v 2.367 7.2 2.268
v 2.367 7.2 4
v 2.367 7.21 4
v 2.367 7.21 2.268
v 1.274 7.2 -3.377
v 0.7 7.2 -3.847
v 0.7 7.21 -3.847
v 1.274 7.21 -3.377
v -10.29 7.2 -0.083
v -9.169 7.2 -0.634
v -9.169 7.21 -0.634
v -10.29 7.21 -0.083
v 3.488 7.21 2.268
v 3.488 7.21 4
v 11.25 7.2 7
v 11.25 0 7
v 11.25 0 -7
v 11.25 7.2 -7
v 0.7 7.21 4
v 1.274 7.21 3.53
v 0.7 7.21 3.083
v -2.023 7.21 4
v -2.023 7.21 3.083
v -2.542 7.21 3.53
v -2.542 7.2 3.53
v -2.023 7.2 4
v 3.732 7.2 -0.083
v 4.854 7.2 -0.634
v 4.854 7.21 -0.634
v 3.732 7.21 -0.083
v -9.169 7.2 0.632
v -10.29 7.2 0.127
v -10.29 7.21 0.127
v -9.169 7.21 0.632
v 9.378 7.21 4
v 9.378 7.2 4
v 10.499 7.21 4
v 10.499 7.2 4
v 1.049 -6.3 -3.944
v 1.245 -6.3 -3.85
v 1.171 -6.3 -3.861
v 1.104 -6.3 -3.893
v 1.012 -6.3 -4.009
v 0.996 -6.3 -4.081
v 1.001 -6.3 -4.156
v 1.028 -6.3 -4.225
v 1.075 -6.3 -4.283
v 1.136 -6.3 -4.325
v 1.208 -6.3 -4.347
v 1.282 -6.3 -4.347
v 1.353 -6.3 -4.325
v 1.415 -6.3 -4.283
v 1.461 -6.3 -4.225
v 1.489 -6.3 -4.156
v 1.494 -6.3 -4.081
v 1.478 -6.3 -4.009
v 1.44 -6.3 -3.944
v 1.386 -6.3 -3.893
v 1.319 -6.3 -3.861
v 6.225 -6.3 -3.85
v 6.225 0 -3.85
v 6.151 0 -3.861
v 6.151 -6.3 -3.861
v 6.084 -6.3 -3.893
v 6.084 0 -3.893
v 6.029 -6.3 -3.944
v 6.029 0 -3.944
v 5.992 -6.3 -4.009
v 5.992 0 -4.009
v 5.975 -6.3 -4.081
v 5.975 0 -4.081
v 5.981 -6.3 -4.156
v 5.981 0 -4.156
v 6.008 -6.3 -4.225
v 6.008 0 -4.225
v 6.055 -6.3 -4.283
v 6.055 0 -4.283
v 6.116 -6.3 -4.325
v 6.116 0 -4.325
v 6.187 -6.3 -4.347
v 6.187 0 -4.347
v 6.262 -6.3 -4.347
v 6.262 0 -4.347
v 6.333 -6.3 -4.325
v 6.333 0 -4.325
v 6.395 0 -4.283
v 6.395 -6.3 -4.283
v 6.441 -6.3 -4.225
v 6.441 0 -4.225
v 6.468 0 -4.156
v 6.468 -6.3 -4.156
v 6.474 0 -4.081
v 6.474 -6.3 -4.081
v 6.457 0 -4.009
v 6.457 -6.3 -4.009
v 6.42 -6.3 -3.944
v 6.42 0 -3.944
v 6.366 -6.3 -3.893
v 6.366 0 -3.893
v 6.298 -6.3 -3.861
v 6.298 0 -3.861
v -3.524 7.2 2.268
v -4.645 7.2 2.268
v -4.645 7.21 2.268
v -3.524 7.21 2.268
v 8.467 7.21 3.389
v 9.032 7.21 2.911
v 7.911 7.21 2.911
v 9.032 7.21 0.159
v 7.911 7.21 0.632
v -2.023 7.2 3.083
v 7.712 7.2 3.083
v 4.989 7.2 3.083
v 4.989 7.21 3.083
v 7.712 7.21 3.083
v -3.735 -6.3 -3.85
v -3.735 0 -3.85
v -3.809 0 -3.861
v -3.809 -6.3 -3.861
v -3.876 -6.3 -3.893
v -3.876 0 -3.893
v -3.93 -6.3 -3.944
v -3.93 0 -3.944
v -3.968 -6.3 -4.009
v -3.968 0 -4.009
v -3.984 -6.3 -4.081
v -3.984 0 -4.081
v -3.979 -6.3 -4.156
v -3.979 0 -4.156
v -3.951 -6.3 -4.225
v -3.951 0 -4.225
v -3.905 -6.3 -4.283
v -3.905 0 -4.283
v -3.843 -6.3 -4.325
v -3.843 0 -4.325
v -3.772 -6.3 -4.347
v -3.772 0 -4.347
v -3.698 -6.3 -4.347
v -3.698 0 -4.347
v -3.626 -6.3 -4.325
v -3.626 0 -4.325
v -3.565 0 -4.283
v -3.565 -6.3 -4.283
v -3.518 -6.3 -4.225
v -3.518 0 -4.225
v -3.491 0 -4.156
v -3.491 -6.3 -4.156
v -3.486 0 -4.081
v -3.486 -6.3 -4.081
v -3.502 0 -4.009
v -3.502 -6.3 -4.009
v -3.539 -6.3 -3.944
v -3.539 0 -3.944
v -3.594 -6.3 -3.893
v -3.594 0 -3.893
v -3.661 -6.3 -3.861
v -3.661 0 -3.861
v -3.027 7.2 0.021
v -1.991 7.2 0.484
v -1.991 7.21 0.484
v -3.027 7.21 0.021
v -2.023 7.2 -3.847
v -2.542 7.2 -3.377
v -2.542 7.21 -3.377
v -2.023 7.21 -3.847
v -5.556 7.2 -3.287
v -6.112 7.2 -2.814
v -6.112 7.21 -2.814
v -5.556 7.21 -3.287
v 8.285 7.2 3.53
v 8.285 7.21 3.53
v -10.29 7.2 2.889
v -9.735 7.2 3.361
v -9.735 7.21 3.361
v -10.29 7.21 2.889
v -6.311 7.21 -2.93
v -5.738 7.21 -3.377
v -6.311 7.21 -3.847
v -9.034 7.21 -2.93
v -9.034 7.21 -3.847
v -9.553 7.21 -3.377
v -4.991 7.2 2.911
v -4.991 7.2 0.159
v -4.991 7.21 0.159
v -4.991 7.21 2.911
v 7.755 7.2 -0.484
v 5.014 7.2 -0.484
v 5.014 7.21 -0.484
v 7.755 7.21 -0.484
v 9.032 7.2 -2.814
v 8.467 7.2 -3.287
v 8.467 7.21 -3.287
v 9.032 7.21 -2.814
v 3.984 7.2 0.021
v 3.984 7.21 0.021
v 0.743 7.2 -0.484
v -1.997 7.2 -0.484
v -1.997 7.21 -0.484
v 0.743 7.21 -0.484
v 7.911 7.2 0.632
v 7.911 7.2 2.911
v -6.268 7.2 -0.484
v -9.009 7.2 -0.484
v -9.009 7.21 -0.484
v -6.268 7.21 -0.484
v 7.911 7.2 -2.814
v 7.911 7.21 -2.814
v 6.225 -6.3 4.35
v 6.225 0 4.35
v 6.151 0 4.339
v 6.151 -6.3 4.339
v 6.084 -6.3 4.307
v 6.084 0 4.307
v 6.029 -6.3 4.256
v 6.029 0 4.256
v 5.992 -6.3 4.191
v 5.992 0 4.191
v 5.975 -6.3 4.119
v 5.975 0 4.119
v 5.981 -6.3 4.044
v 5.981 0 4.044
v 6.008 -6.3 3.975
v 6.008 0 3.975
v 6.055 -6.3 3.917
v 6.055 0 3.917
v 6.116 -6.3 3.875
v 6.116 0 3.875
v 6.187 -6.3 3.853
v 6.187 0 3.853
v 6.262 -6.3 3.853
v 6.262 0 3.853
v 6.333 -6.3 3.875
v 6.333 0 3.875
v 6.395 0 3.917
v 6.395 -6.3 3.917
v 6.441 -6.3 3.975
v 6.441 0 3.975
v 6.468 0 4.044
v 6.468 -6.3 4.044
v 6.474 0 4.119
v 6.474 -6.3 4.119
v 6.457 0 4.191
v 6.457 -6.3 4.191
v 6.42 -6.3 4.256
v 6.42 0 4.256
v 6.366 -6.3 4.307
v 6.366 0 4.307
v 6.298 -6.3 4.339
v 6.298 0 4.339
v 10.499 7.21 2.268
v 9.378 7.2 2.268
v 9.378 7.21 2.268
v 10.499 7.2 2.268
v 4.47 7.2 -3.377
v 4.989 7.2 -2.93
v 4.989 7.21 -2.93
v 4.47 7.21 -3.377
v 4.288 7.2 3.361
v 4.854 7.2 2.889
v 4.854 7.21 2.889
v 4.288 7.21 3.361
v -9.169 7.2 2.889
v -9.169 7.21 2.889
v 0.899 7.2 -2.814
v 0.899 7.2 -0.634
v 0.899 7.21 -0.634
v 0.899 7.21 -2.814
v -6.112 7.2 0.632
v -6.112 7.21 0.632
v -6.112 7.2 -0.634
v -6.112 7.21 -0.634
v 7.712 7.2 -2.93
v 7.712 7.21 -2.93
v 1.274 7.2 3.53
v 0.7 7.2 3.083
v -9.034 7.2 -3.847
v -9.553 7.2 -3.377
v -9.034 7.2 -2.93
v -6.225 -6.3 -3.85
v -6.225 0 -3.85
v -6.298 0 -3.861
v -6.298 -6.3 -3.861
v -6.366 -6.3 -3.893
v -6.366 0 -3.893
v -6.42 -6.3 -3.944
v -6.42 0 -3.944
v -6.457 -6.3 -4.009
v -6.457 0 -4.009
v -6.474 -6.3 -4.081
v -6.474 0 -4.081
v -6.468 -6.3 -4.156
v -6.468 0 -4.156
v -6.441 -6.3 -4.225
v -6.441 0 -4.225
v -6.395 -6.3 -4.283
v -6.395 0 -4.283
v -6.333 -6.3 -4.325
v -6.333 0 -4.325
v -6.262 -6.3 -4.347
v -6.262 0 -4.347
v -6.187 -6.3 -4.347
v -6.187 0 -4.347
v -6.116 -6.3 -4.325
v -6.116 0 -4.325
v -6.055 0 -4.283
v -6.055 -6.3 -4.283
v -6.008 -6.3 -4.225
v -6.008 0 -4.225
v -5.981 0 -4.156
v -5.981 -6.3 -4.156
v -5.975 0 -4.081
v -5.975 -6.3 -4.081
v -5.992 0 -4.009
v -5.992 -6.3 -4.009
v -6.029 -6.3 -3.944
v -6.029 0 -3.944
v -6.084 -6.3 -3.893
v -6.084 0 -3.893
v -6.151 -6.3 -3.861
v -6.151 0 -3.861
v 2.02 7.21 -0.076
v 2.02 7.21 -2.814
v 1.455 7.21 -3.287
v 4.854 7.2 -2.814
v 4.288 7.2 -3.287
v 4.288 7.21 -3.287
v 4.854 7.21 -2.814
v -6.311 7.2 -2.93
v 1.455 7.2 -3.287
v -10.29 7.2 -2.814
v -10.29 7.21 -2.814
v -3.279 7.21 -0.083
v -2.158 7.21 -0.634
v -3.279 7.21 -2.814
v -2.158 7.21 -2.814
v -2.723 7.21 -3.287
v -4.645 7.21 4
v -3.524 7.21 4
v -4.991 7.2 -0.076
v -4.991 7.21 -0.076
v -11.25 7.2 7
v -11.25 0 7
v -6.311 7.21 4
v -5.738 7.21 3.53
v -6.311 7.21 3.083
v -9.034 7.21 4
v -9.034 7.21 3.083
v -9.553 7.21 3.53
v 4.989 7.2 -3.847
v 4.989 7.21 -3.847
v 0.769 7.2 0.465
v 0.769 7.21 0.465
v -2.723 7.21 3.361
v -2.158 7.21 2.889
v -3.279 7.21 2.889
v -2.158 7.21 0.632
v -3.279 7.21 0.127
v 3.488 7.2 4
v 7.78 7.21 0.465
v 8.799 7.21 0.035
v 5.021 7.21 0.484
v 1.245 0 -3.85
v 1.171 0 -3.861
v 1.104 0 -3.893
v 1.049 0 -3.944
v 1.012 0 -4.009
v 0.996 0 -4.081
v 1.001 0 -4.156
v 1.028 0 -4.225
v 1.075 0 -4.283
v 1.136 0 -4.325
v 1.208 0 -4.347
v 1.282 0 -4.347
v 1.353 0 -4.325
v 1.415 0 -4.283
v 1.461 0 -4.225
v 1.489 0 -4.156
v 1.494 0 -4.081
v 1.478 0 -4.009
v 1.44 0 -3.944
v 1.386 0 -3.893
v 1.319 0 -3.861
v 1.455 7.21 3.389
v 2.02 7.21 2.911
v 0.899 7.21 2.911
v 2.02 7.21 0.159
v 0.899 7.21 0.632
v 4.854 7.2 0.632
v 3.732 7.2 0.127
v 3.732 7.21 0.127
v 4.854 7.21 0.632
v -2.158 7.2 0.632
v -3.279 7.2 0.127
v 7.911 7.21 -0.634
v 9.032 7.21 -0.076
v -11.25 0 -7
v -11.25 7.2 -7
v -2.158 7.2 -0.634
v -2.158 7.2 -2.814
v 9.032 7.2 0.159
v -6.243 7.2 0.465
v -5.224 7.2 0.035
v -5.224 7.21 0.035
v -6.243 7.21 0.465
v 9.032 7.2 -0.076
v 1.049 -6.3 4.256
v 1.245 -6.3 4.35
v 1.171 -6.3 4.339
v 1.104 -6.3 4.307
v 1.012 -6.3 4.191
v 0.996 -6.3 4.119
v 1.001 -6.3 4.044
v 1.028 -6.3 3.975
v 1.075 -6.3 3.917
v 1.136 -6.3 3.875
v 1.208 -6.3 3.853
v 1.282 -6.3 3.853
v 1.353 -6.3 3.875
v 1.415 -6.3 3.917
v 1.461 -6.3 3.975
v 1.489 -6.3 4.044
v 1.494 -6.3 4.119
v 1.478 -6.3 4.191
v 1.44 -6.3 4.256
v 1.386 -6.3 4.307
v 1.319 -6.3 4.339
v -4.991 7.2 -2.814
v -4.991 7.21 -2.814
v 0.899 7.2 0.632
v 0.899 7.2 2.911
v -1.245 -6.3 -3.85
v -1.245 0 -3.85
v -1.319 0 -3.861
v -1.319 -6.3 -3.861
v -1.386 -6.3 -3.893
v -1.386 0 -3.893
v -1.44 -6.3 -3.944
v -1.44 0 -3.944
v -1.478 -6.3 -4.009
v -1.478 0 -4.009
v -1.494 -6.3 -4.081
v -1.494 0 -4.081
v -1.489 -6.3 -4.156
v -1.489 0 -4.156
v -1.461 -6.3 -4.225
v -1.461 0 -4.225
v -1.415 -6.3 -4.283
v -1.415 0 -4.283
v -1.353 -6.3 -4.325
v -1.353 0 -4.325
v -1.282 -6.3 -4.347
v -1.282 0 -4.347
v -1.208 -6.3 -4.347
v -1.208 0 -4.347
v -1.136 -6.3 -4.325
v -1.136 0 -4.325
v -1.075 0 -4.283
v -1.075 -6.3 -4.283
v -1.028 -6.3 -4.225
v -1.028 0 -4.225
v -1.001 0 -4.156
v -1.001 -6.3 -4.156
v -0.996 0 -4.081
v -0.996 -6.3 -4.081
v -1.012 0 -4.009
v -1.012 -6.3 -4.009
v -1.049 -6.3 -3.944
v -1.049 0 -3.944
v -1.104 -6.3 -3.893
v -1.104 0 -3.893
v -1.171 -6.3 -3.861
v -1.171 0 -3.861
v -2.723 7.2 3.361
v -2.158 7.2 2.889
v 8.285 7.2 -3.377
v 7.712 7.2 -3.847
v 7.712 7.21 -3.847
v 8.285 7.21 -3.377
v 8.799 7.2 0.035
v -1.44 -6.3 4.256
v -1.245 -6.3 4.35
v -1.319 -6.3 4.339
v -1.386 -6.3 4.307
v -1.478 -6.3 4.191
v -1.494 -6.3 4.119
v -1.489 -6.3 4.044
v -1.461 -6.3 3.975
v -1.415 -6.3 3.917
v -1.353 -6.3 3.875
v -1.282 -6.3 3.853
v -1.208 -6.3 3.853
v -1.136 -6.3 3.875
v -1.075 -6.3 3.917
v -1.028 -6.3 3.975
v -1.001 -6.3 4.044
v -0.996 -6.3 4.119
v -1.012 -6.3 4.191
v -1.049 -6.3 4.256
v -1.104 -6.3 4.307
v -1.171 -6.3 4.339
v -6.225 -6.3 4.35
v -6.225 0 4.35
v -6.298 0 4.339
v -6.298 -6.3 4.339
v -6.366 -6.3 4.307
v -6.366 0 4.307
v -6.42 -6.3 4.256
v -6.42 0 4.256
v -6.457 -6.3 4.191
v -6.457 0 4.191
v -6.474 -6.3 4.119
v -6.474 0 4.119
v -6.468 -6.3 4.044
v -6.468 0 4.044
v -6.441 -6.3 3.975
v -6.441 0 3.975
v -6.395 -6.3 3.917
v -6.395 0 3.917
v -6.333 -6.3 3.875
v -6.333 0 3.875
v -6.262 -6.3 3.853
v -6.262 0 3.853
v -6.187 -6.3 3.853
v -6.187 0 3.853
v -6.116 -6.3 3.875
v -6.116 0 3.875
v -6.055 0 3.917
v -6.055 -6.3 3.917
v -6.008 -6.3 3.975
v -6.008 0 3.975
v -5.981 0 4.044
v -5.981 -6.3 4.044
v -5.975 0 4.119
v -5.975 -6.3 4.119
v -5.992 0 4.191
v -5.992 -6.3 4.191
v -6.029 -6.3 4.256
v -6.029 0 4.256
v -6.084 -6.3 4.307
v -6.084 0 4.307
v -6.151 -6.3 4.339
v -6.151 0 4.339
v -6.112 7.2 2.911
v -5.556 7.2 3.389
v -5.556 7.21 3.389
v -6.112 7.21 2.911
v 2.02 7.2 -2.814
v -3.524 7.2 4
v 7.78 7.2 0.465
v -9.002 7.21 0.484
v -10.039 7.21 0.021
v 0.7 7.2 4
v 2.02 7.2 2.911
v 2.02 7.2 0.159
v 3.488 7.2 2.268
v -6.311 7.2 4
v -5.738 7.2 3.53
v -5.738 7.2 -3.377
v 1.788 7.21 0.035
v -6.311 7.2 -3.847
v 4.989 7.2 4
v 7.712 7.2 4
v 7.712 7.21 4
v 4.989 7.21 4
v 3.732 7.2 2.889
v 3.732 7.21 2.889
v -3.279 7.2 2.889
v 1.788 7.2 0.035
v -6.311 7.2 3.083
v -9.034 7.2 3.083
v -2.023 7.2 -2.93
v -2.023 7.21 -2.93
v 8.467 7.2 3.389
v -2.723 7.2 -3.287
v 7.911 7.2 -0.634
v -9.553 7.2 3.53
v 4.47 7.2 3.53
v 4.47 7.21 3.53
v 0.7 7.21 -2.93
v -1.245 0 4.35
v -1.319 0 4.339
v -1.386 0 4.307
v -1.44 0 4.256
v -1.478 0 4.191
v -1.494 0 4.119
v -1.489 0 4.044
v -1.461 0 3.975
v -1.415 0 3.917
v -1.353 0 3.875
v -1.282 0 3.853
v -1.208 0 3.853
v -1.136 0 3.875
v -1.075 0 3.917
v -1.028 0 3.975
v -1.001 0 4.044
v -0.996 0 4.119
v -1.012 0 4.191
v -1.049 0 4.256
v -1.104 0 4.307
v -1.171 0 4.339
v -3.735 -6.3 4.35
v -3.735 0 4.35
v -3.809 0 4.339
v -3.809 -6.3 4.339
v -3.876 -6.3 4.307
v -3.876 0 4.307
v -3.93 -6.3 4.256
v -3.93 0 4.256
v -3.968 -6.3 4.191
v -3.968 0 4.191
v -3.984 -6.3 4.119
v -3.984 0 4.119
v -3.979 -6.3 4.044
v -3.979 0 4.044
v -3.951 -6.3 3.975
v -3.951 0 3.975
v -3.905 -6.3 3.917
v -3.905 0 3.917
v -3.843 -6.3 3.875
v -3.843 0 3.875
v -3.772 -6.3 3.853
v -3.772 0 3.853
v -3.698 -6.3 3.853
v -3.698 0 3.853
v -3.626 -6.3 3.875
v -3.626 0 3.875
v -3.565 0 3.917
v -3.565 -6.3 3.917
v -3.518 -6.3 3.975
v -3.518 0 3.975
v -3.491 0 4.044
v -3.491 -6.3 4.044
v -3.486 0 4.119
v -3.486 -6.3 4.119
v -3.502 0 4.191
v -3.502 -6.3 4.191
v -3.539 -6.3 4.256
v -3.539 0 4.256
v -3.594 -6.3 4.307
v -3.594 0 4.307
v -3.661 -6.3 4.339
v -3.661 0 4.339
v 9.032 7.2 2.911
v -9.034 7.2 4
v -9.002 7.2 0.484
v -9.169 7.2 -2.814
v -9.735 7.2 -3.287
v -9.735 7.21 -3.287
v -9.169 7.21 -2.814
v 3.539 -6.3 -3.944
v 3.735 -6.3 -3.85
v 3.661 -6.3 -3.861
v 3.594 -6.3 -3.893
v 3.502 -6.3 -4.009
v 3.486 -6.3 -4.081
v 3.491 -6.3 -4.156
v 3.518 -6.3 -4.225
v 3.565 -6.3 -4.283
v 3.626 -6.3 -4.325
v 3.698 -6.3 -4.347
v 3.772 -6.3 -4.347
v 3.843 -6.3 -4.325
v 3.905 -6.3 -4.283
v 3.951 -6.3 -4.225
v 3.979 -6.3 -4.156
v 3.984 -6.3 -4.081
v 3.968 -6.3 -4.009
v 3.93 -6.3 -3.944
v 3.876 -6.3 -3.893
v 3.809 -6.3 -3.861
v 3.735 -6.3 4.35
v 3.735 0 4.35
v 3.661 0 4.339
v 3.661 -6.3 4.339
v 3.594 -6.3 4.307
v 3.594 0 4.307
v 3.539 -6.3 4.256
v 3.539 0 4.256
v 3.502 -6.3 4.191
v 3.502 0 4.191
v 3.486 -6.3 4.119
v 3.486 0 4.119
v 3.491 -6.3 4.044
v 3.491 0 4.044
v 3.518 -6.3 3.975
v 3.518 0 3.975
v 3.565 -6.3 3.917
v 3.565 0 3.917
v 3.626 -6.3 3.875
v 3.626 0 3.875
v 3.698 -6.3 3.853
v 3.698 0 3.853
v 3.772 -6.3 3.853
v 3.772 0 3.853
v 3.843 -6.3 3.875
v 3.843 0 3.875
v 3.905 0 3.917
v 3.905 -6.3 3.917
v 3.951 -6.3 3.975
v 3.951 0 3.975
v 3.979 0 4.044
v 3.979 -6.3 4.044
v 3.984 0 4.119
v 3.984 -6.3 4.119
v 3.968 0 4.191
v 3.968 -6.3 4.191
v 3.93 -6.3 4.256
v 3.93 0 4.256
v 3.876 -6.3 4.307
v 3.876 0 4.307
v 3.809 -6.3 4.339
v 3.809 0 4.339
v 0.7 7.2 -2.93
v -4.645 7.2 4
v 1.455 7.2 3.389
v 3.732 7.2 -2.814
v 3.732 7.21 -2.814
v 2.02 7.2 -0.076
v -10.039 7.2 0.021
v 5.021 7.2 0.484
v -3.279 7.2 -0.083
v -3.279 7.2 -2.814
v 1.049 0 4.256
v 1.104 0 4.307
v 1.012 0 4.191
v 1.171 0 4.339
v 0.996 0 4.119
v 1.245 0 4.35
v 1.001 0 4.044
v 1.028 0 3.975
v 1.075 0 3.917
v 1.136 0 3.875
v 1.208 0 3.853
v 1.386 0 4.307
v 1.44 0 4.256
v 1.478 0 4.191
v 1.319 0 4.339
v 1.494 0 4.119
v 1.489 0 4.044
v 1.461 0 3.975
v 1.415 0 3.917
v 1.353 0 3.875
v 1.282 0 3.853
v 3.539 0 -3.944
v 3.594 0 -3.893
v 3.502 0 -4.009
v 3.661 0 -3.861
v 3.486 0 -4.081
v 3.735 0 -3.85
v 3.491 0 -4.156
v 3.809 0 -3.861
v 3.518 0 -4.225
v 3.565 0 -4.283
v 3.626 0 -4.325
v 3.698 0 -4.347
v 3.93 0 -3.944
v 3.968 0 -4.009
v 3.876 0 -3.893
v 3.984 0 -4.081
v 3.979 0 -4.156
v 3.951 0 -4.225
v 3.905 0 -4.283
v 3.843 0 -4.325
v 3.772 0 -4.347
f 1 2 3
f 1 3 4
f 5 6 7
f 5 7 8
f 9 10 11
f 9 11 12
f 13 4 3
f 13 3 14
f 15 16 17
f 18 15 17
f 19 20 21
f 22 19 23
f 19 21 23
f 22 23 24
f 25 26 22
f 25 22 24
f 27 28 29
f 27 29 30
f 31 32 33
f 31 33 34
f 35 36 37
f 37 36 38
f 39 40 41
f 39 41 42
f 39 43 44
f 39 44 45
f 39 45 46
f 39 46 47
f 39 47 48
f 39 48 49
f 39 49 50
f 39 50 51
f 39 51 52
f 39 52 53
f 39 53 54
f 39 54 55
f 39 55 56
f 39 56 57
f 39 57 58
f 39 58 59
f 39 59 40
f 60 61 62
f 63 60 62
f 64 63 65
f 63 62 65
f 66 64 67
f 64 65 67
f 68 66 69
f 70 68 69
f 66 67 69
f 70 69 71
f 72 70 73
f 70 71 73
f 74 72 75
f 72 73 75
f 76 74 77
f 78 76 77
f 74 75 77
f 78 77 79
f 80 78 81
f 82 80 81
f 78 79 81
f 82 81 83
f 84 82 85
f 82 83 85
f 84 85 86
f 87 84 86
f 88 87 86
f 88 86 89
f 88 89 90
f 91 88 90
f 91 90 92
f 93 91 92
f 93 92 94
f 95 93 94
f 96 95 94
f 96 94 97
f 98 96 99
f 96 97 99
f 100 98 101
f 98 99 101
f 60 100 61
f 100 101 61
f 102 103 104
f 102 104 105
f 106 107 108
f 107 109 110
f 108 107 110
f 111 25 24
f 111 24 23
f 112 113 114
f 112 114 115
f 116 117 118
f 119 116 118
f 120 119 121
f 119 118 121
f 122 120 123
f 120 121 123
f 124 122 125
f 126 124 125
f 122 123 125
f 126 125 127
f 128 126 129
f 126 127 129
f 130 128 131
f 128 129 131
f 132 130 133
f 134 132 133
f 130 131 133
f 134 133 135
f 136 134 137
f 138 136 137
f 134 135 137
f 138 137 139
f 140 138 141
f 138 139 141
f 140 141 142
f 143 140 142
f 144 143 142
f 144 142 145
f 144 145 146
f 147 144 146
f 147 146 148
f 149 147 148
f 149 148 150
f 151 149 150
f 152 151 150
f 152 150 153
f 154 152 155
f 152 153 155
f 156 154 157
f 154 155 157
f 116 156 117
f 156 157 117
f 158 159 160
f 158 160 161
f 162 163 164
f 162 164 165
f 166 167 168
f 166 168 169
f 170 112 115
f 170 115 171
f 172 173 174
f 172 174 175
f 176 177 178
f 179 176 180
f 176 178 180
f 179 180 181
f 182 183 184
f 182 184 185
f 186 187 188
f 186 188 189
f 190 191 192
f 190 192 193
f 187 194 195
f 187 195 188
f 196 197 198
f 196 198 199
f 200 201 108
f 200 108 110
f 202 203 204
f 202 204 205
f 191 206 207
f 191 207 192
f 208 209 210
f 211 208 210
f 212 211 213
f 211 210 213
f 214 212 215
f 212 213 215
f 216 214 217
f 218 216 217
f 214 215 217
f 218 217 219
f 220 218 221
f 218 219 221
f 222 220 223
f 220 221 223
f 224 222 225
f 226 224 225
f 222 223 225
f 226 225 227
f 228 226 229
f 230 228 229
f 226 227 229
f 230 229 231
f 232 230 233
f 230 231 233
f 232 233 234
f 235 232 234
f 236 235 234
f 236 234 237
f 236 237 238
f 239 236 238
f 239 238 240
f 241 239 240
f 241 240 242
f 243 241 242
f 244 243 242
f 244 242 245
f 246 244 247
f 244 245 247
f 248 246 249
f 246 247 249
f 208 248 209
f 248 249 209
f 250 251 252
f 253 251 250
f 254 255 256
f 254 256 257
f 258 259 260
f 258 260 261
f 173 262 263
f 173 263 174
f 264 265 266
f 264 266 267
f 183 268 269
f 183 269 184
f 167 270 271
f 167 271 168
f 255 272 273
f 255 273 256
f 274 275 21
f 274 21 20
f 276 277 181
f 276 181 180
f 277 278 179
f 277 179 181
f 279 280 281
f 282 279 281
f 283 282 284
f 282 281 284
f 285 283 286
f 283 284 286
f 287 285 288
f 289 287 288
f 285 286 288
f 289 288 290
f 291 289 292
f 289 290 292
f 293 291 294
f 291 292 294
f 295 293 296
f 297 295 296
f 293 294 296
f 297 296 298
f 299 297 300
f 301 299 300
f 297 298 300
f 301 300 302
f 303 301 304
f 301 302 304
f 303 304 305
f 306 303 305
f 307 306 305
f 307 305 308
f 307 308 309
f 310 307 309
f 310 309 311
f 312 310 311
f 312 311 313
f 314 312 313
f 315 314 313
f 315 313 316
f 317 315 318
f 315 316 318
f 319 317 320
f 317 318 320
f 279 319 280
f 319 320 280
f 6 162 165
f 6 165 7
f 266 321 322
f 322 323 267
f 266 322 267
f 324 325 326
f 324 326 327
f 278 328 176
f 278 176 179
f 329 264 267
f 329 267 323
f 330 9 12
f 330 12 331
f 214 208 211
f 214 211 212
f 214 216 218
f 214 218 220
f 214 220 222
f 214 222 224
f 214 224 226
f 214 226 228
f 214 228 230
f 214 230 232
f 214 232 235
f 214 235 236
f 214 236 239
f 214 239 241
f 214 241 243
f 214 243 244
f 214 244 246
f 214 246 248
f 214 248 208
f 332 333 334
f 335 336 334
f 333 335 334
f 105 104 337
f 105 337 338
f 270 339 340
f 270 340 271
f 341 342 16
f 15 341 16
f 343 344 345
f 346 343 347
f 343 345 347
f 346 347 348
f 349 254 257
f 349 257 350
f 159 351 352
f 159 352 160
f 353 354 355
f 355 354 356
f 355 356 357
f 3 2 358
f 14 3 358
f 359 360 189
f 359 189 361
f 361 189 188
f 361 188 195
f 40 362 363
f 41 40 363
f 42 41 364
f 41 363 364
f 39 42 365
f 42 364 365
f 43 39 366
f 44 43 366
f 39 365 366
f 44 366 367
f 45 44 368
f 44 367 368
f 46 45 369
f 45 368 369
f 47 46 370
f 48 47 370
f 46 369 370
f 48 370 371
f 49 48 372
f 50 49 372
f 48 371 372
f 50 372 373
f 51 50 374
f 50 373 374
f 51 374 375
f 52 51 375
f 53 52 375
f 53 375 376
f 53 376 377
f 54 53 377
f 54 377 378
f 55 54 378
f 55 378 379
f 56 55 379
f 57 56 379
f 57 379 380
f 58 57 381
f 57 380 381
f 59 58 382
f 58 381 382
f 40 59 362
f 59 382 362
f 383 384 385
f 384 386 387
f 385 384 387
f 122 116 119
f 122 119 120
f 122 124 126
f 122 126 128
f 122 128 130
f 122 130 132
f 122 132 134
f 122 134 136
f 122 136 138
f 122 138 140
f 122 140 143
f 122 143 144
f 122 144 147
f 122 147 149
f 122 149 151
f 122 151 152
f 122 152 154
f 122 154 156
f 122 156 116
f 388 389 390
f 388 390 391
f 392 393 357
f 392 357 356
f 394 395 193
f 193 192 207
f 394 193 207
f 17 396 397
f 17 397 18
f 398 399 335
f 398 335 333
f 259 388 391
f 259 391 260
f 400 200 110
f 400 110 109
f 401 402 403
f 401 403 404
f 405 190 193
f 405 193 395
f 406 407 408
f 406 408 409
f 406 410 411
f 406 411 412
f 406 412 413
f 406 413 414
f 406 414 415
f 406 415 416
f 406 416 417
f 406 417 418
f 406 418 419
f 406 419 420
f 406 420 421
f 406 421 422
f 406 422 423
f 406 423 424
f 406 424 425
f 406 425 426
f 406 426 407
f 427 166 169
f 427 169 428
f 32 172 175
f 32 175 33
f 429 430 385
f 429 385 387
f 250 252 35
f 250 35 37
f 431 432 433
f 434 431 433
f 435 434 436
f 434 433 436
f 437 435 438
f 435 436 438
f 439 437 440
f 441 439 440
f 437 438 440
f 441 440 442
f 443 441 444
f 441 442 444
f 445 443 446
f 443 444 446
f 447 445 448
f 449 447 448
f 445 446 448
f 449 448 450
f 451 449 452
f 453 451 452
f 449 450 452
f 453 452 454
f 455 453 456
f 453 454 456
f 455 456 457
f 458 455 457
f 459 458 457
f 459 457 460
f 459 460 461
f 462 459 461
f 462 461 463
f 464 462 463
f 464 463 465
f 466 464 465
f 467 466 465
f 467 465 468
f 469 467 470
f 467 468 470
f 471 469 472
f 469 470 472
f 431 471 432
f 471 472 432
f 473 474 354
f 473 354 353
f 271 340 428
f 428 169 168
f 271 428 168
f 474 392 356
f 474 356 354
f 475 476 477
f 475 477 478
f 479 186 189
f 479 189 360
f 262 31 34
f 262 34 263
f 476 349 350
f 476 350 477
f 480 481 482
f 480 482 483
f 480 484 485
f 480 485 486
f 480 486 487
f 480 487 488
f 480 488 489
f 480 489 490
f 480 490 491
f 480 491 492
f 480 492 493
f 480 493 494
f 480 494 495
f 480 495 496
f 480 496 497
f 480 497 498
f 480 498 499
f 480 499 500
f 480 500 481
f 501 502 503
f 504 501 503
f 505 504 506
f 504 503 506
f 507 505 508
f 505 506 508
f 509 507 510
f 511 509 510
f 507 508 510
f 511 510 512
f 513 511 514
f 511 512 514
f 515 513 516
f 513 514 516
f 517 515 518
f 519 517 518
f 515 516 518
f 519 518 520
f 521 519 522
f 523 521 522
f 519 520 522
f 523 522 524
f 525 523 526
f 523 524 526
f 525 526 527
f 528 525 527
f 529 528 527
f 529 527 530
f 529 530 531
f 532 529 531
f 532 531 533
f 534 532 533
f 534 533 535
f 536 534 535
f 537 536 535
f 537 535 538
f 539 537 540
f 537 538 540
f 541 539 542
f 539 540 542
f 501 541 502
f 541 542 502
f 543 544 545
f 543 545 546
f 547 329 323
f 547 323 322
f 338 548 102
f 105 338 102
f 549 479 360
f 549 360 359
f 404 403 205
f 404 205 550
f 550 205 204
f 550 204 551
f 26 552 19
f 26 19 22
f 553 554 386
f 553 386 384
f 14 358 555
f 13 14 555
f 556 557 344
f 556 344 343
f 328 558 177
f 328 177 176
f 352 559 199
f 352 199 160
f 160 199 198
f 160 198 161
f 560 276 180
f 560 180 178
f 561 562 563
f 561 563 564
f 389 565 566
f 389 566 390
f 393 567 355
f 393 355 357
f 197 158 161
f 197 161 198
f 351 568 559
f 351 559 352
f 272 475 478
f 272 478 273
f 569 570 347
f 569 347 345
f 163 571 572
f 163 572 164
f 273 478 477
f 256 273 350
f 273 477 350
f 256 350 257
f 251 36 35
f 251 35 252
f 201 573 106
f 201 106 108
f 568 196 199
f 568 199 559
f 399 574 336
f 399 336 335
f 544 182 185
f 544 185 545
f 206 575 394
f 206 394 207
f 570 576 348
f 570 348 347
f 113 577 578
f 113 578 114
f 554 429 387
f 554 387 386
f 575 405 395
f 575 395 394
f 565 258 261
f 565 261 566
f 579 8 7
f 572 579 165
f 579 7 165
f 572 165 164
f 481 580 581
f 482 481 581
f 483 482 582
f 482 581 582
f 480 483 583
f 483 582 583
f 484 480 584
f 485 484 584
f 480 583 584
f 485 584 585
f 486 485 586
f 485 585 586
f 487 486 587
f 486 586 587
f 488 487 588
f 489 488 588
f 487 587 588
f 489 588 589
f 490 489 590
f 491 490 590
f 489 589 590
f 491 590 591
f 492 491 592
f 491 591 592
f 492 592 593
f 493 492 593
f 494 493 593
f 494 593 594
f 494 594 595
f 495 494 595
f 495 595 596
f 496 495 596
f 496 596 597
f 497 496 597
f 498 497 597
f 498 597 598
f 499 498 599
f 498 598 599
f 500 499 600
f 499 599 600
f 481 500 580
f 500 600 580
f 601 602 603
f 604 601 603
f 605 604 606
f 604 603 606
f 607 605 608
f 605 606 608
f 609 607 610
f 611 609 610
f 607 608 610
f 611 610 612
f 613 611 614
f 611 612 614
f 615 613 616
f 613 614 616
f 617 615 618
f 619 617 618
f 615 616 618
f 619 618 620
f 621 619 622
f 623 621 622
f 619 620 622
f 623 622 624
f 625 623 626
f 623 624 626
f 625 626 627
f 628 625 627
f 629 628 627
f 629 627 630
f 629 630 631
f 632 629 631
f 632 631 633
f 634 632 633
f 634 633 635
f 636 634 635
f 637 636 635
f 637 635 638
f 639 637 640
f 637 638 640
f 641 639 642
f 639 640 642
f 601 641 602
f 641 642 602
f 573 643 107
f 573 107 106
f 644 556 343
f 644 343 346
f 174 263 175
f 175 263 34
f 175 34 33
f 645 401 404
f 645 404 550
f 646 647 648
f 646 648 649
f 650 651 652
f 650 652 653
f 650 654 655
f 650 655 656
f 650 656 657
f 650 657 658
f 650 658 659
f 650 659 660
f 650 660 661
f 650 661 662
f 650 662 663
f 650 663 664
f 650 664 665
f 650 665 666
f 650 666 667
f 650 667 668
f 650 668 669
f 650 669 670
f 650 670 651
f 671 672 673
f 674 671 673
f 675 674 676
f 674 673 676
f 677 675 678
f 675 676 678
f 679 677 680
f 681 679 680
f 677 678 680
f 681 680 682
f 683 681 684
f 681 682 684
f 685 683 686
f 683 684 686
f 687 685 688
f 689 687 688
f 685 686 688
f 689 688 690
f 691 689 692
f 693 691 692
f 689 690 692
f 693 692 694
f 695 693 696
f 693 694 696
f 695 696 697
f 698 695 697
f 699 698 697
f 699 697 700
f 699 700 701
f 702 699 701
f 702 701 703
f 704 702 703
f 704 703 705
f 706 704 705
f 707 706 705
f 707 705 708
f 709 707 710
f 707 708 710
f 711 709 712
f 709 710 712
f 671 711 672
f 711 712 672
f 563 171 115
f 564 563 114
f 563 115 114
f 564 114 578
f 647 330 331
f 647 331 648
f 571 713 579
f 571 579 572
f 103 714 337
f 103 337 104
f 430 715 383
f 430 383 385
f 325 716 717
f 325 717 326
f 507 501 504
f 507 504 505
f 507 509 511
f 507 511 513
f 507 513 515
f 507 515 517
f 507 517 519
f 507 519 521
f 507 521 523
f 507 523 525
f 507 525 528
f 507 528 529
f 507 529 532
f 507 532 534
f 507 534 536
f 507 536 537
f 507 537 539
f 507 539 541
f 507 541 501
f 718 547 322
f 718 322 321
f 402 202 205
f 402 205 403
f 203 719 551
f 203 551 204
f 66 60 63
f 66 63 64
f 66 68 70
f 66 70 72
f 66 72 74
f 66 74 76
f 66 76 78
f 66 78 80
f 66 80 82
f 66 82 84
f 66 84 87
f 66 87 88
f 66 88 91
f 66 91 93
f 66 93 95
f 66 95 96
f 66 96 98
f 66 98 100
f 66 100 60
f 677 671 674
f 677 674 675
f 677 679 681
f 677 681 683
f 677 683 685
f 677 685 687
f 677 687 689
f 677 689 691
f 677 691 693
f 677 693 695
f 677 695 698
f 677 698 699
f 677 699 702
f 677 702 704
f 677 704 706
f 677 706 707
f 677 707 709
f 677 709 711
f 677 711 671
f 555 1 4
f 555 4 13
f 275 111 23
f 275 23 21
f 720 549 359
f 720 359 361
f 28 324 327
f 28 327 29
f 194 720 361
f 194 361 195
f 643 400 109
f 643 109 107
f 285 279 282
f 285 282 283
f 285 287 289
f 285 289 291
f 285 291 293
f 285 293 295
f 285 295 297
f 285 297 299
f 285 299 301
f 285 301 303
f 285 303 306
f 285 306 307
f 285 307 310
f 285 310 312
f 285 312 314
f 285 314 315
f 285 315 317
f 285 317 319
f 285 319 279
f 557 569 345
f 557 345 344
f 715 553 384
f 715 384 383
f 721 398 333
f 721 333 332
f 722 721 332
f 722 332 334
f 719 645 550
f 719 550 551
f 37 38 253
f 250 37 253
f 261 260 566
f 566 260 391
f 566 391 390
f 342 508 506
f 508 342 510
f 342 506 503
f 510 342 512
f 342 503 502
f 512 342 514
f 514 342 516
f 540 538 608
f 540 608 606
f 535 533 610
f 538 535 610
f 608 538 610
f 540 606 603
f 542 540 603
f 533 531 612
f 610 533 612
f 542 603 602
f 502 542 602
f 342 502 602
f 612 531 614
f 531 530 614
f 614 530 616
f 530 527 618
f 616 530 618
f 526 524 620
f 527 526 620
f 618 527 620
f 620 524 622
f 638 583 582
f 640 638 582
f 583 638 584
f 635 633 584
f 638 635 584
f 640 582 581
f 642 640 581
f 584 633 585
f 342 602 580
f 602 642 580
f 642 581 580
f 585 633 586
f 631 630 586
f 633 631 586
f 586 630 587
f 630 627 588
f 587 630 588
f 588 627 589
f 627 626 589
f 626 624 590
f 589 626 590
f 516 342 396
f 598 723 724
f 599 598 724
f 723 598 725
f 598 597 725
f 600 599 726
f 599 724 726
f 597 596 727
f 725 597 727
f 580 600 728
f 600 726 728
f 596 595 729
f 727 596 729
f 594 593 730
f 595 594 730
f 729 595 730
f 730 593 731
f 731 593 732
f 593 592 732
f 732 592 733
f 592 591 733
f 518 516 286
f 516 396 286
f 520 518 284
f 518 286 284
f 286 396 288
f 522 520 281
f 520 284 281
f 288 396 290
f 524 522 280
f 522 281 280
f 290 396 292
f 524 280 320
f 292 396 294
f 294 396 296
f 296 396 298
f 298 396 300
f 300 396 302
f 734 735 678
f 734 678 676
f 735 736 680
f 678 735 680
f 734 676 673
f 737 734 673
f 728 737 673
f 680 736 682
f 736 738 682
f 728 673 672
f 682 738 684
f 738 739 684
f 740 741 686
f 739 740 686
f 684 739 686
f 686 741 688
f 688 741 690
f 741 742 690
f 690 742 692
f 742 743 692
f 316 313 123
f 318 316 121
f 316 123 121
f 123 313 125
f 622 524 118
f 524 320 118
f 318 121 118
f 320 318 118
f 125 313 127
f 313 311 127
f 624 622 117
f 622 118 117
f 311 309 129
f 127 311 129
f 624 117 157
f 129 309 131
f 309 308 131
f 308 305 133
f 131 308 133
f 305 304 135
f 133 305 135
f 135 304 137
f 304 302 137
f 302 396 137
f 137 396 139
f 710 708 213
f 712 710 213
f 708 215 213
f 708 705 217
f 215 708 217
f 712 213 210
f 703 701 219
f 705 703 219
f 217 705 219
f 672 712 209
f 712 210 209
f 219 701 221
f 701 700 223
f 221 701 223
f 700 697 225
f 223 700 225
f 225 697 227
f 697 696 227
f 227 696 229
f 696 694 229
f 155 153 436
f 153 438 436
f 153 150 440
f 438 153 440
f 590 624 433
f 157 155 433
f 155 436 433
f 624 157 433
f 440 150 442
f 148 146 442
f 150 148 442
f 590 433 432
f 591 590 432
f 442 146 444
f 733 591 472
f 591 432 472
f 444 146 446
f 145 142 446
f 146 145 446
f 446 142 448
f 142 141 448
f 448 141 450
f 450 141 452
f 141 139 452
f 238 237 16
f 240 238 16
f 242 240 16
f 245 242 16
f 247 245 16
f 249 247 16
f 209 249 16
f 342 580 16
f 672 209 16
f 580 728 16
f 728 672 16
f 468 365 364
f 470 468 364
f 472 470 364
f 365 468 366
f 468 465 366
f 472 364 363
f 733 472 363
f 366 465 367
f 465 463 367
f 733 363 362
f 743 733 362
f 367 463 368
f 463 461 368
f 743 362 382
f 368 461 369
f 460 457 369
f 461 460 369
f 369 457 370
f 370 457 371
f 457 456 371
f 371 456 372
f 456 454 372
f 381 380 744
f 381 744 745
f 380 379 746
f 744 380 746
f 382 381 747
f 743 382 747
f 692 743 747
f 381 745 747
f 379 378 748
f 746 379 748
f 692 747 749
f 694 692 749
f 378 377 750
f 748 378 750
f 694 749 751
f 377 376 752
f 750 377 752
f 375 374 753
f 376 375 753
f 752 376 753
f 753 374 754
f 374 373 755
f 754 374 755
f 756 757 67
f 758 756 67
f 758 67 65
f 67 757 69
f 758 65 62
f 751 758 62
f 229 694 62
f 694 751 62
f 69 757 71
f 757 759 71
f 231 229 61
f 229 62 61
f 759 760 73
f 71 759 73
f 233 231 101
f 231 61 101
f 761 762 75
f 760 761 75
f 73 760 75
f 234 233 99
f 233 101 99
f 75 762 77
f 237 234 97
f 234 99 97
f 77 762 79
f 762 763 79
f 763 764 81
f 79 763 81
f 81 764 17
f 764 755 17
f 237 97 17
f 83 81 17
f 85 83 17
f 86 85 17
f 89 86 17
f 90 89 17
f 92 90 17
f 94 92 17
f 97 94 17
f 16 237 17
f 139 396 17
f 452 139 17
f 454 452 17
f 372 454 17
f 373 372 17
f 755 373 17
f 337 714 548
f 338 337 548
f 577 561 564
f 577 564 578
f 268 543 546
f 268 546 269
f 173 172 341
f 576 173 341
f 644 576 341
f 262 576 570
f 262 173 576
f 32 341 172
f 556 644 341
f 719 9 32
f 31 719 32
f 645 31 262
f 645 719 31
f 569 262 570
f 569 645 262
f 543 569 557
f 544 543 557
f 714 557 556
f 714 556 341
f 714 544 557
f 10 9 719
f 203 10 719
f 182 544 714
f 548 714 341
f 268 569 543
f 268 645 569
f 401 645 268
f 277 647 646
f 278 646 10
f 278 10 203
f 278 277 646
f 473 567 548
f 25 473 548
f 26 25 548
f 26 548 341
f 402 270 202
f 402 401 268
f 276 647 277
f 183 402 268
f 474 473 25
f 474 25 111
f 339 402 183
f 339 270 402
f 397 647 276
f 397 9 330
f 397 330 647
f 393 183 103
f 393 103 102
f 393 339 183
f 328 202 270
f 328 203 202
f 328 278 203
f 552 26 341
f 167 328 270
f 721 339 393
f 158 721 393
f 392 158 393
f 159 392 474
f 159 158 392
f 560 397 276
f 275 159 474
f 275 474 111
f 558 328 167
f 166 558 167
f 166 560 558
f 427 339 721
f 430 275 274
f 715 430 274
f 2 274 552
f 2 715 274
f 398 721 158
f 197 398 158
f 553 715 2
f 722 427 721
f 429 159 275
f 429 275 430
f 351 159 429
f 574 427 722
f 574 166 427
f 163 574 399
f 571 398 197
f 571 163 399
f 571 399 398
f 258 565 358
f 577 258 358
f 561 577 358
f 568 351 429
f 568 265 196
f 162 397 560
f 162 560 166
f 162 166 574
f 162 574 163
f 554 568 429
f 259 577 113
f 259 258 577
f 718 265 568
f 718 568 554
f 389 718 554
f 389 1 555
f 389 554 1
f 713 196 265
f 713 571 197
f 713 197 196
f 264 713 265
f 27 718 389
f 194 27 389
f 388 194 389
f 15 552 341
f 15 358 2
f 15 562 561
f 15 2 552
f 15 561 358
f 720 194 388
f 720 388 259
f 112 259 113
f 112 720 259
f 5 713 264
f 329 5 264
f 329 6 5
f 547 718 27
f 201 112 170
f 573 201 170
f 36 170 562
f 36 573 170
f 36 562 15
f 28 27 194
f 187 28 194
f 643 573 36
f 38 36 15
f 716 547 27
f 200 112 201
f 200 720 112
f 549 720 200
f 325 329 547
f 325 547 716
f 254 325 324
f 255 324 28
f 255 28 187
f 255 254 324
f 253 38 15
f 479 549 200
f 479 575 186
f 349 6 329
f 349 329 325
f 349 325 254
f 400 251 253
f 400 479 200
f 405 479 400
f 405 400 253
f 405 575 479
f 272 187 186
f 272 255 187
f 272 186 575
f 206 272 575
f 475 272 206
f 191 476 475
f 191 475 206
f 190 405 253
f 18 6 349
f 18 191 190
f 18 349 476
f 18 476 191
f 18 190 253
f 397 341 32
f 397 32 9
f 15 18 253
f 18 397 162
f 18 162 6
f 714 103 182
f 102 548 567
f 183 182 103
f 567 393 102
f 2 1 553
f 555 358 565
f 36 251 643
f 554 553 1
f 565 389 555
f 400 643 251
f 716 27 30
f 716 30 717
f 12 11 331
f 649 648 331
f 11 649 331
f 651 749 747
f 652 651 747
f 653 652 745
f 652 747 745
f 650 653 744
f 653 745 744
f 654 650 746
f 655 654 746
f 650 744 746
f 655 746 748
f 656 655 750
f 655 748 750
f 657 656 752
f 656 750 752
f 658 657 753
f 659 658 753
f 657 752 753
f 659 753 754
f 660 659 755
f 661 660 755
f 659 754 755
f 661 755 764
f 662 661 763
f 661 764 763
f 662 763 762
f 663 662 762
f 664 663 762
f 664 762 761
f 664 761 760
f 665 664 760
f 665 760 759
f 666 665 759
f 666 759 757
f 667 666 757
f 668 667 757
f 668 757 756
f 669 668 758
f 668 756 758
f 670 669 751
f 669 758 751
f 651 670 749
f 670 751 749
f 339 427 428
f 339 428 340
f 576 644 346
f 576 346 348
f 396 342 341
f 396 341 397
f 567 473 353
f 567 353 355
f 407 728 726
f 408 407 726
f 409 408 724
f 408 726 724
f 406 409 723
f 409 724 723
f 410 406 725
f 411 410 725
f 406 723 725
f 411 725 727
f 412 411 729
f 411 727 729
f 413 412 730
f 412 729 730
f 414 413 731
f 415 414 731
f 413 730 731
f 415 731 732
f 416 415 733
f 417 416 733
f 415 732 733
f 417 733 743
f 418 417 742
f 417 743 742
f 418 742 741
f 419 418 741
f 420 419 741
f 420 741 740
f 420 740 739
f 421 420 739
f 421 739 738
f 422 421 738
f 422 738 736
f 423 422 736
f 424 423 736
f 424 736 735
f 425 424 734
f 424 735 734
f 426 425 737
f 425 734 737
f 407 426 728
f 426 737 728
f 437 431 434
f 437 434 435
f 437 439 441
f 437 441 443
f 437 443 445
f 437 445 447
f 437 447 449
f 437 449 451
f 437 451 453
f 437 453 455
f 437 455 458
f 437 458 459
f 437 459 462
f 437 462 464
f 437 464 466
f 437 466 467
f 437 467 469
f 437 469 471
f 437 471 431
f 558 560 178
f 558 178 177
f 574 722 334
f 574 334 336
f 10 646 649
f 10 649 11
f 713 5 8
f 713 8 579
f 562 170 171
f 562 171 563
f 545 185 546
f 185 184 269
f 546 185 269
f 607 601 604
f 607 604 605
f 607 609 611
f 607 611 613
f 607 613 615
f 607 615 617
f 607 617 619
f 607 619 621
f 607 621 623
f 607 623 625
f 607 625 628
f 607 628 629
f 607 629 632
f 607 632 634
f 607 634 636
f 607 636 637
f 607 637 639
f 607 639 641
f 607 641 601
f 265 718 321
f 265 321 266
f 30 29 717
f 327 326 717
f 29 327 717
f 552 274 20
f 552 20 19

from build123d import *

# Parameters (mm, degrees)
SKETCH_1_W        = 22.5
SKETCH_1_H        = 14
EXTRUDE_1_DEPTH   = 7.2
SKETCH_2_R        = 0.25
EXTRUDE_2_DEPTH   = 6.3
SKETCH_3_W        = 1.121019108
SKETCH_3_H        = 1.732484076
EXTRUDE_1_2_DEPTH = 0.01


with BuildPart() as part:
    # 草图1 → Extrude 1 (new body)
    with BuildSketch(Plane(origin=(0, 0, 0), x_dir=(1, 0, 0), z_dir=(0, 1, 0))):
        Rectangle(SKETCH_1_W, SKETCH_1_H)
    extrude(amount=EXTRUDE_1_DEPTH)

    # 草图2 → 拉伸2 (add)
    with BuildSketch(Plane.XZ):
        with Locations(Location((6.224686657, 4.1, 0), (0, 0, 90))):
            Circle(SKETCH_2_R)
        with Locations(Location((3.734811994, 4.1, 0), (0, 0, 90))):
            Circle(SKETCH_2_R)
        with Locations(Location((1.244937331, 4.1, 0), (0, 0, 90))):
            Circle(SKETCH_2_R)
        with Locations(Location((-1.244937331, 4.1, 0), (0, 0, 90))):
            Circle(SKETCH_2_R)
        with Locations(Location((-3.734811994, 4.1, 0), (0, 0, 90))):
            Circle(SKETCH_2_R)
        with Locations(Location((-6.224686657, 4.1, 0), (0, 0, 90))):
            Circle(SKETCH_2_R)
        with Locations(Location((-6.224686657, -4.1, 0), (0, 0, 90))):
            Circle(SKETCH_2_R)
        with Locations(Location((-3.734811994, -4.1, 0), (0, 0, 90))):
            Circle(SKETCH_2_R)
        with Locations(Location((-1.244937331, -4.1, 0), (0, 0, 90))):
            Circle(SKETCH_2_R)
        with Locations(Location((1.244937331, -4.1, 0), (0, 0, 90))):
            Circle(SKETCH_2_R)
        with Locations(Location((3.734811994, -4.1, 0), (0, 0, 90))):
            Circle(SKETCH_2_R)
        with Locations(Location((6.224686657, -4.1, 0), (0, 0, 90))):
            Circle(SKETCH_2_R)
    extrude(amount=EXTRUDE_2_DEPTH)

    # 草图3 → Extrude 1 2 (add)
    with BuildSketch(Plane(origin=(0, 7.2, 0), x_dir=(1, 0, 0), z_dir=(0, 1, 0))):
        Polygon((-4.991082803, 0.076433121), (-6.112101911, 0.633757962), (-6.112101911, 2.813694268), (-5.556369427, 3.286624204), (-4.991082803, 2.813694268), align=None)
        Polygon((-5.737898089, 3.377388535), (-6.311146497, 2.929936306), (-9.034076433, 2.929936306), (-9.553184713, 3.377388535), (-9.034076433, 3.847133758), (-6.311146497, 3.847133758), align=None)
        Polygon((-4.991082803, -2.910828025), (-5.556369427, -3.388535032), (-6.112101911, -2.910828025), (-6.112101911, -0.632165605), (-4.991082803, -0.159235669), align=None)
        Polygon((-5.223566879, -0.035031847), (-6.242675159, -0.464968153), (-9.002229299, -0.484076433), (-10.038853503, -0.020700637), (-9.008598726, 0.484076433), (-6.268152866, 0.484076433), align=None)
        Polygon((-9.169426752, 0.633757962), (-10.29044586, 0.082802548), (-10.29044586, 2.813694268), (-9.734713376, 3.286624204), (-9.169426752, 2.813694268), align=None)
        Polygon((-9.169426752, -2.888535032), (-9.734713376, -3.361464968), (-10.29044586, -2.888535032), (-10.29044586, -0.127388535), (-9.169426752, -0.632165605), align=None)
        Polygon((-5.737898089, -3.530254777), (-6.311146497, -4), (-9.034076433, -4), (-9.553184713, -3.530254777), (-9.034076433, -3.082802548), (-6.311146497, -3.082802548), align=None)
        with Locations((-4.084076433, -3.133757962)):
            Rectangle(SKETCH_3_W, SKETCH_3_H)
        Polygon((2.020382166, 0.076433121), (0.899363057, 0.633757962), (0.899363057, 2.813694268), (1.455095541, 3.286624204), (2.020382166, 2.813694268), align=None)
        Polygon((1.273566879, 3.377388535), (0.700318471, 2.929936306), (-2.022611465, 2.929936306), (-2.541719745, 3.377388535), (-2.022611465, 3.847133758), (0.700318471, 3.847133758), align=None)
        Polygon((2.020382166, -2.910828025), (1.455095541, -3.388535032), (0.899363057, -2.910828025), (0.899363057, -0.632165605), (2.020382166, -0.159235669), align=None)
        Polygon((1.787898089, -0.035031847), (0.768789809, -0.464968153), (-1.990764331, -0.484076433), (-3.027388535, -0.020700637), (-1.997133758, 0.484076433), (0.743312102, 0.484076433), align=None)
        Polygon((-2.157961783, 0.633757962), (-3.278980892, 0.082802548), (-3.278980892, 2.813694268), (-2.723248408, 3.286624204), (-2.157961783, 2.813694268), align=None)
        Polygon((-2.157961783, -2.888535032), (-2.723248408, -3.361464968), (-3.278980892, -2.888535032), (-3.278980892, -0.127388535), (-2.157961783, -0.632165605), align=None)
        Polygon((1.273566879, -3.530254777), (0.700318471, -4), (-2.022611465, -4), (-2.541719745, -3.530254777), (-2.022611465, -3.082802548), (0.700318471, -3.082802548), align=None)
        with Locations((2.927388535, -3.133757962)):
            Rectangle(SKETCH_3_W, SKETCH_3_H)
        Polygon((9.031847134, 0.076433121), (7.910828025, 0.633757962), (7.910828025, 2.813694268), (8.46656051, 3.286624204), (9.031847134, 2.813694268), align=None)
        Polygon((8.285031847, 3.377388535), (7.711783439, 2.929936306), (4.988853503, 2.929936306), (4.469745223, 3.377388535), (4.988853503, 3.847133758), (7.711783439, 3.847133758), align=None)
        Polygon((9.031847134, -2.910828025), (8.46656051, -3.388535032), (7.910828025, -2.910828025), (7.910828025, -0.632165605), (9.031847134, -0.159235669), align=None)
        Polygon((8.799363057, -0.035031847), (7.780254777, -0.464968153), (5.020700637, -0.484076433), (3.984076433, -0.020700637), (5.01433121, 0.484076433), (7.75477707, 0.484076433), align=None)
        Polygon((4.853503185, 0.633757962), (3.732484076, 0.082802548), (3.732484076, 2.813694268), (4.288216561, 3.286624204), (4.853503185, 2.813694268), align=None)
        Polygon((4.853503185, -2.888535032), (4.288216561, -3.361464968), (3.732484076, -2.888535032), (3.732484076, -0.127388535), (4.853503185, -0.632165605), align=None)
        Polygon((8.285031847, -3.530254777), (7.711783439, -4), (4.988853503, -4), (4.469745223, -3.530254777), (4.988853503, -3.082802548), (7.711783439, -3.082802548), align=None)
        with Locations((9.938853503, -3.133757962)):
            Rectangle(SKETCH_3_W, SKETCH_3_H)
    extrude(amount=EXTRUDE_1_2_DEPTH)


solid = part.part
